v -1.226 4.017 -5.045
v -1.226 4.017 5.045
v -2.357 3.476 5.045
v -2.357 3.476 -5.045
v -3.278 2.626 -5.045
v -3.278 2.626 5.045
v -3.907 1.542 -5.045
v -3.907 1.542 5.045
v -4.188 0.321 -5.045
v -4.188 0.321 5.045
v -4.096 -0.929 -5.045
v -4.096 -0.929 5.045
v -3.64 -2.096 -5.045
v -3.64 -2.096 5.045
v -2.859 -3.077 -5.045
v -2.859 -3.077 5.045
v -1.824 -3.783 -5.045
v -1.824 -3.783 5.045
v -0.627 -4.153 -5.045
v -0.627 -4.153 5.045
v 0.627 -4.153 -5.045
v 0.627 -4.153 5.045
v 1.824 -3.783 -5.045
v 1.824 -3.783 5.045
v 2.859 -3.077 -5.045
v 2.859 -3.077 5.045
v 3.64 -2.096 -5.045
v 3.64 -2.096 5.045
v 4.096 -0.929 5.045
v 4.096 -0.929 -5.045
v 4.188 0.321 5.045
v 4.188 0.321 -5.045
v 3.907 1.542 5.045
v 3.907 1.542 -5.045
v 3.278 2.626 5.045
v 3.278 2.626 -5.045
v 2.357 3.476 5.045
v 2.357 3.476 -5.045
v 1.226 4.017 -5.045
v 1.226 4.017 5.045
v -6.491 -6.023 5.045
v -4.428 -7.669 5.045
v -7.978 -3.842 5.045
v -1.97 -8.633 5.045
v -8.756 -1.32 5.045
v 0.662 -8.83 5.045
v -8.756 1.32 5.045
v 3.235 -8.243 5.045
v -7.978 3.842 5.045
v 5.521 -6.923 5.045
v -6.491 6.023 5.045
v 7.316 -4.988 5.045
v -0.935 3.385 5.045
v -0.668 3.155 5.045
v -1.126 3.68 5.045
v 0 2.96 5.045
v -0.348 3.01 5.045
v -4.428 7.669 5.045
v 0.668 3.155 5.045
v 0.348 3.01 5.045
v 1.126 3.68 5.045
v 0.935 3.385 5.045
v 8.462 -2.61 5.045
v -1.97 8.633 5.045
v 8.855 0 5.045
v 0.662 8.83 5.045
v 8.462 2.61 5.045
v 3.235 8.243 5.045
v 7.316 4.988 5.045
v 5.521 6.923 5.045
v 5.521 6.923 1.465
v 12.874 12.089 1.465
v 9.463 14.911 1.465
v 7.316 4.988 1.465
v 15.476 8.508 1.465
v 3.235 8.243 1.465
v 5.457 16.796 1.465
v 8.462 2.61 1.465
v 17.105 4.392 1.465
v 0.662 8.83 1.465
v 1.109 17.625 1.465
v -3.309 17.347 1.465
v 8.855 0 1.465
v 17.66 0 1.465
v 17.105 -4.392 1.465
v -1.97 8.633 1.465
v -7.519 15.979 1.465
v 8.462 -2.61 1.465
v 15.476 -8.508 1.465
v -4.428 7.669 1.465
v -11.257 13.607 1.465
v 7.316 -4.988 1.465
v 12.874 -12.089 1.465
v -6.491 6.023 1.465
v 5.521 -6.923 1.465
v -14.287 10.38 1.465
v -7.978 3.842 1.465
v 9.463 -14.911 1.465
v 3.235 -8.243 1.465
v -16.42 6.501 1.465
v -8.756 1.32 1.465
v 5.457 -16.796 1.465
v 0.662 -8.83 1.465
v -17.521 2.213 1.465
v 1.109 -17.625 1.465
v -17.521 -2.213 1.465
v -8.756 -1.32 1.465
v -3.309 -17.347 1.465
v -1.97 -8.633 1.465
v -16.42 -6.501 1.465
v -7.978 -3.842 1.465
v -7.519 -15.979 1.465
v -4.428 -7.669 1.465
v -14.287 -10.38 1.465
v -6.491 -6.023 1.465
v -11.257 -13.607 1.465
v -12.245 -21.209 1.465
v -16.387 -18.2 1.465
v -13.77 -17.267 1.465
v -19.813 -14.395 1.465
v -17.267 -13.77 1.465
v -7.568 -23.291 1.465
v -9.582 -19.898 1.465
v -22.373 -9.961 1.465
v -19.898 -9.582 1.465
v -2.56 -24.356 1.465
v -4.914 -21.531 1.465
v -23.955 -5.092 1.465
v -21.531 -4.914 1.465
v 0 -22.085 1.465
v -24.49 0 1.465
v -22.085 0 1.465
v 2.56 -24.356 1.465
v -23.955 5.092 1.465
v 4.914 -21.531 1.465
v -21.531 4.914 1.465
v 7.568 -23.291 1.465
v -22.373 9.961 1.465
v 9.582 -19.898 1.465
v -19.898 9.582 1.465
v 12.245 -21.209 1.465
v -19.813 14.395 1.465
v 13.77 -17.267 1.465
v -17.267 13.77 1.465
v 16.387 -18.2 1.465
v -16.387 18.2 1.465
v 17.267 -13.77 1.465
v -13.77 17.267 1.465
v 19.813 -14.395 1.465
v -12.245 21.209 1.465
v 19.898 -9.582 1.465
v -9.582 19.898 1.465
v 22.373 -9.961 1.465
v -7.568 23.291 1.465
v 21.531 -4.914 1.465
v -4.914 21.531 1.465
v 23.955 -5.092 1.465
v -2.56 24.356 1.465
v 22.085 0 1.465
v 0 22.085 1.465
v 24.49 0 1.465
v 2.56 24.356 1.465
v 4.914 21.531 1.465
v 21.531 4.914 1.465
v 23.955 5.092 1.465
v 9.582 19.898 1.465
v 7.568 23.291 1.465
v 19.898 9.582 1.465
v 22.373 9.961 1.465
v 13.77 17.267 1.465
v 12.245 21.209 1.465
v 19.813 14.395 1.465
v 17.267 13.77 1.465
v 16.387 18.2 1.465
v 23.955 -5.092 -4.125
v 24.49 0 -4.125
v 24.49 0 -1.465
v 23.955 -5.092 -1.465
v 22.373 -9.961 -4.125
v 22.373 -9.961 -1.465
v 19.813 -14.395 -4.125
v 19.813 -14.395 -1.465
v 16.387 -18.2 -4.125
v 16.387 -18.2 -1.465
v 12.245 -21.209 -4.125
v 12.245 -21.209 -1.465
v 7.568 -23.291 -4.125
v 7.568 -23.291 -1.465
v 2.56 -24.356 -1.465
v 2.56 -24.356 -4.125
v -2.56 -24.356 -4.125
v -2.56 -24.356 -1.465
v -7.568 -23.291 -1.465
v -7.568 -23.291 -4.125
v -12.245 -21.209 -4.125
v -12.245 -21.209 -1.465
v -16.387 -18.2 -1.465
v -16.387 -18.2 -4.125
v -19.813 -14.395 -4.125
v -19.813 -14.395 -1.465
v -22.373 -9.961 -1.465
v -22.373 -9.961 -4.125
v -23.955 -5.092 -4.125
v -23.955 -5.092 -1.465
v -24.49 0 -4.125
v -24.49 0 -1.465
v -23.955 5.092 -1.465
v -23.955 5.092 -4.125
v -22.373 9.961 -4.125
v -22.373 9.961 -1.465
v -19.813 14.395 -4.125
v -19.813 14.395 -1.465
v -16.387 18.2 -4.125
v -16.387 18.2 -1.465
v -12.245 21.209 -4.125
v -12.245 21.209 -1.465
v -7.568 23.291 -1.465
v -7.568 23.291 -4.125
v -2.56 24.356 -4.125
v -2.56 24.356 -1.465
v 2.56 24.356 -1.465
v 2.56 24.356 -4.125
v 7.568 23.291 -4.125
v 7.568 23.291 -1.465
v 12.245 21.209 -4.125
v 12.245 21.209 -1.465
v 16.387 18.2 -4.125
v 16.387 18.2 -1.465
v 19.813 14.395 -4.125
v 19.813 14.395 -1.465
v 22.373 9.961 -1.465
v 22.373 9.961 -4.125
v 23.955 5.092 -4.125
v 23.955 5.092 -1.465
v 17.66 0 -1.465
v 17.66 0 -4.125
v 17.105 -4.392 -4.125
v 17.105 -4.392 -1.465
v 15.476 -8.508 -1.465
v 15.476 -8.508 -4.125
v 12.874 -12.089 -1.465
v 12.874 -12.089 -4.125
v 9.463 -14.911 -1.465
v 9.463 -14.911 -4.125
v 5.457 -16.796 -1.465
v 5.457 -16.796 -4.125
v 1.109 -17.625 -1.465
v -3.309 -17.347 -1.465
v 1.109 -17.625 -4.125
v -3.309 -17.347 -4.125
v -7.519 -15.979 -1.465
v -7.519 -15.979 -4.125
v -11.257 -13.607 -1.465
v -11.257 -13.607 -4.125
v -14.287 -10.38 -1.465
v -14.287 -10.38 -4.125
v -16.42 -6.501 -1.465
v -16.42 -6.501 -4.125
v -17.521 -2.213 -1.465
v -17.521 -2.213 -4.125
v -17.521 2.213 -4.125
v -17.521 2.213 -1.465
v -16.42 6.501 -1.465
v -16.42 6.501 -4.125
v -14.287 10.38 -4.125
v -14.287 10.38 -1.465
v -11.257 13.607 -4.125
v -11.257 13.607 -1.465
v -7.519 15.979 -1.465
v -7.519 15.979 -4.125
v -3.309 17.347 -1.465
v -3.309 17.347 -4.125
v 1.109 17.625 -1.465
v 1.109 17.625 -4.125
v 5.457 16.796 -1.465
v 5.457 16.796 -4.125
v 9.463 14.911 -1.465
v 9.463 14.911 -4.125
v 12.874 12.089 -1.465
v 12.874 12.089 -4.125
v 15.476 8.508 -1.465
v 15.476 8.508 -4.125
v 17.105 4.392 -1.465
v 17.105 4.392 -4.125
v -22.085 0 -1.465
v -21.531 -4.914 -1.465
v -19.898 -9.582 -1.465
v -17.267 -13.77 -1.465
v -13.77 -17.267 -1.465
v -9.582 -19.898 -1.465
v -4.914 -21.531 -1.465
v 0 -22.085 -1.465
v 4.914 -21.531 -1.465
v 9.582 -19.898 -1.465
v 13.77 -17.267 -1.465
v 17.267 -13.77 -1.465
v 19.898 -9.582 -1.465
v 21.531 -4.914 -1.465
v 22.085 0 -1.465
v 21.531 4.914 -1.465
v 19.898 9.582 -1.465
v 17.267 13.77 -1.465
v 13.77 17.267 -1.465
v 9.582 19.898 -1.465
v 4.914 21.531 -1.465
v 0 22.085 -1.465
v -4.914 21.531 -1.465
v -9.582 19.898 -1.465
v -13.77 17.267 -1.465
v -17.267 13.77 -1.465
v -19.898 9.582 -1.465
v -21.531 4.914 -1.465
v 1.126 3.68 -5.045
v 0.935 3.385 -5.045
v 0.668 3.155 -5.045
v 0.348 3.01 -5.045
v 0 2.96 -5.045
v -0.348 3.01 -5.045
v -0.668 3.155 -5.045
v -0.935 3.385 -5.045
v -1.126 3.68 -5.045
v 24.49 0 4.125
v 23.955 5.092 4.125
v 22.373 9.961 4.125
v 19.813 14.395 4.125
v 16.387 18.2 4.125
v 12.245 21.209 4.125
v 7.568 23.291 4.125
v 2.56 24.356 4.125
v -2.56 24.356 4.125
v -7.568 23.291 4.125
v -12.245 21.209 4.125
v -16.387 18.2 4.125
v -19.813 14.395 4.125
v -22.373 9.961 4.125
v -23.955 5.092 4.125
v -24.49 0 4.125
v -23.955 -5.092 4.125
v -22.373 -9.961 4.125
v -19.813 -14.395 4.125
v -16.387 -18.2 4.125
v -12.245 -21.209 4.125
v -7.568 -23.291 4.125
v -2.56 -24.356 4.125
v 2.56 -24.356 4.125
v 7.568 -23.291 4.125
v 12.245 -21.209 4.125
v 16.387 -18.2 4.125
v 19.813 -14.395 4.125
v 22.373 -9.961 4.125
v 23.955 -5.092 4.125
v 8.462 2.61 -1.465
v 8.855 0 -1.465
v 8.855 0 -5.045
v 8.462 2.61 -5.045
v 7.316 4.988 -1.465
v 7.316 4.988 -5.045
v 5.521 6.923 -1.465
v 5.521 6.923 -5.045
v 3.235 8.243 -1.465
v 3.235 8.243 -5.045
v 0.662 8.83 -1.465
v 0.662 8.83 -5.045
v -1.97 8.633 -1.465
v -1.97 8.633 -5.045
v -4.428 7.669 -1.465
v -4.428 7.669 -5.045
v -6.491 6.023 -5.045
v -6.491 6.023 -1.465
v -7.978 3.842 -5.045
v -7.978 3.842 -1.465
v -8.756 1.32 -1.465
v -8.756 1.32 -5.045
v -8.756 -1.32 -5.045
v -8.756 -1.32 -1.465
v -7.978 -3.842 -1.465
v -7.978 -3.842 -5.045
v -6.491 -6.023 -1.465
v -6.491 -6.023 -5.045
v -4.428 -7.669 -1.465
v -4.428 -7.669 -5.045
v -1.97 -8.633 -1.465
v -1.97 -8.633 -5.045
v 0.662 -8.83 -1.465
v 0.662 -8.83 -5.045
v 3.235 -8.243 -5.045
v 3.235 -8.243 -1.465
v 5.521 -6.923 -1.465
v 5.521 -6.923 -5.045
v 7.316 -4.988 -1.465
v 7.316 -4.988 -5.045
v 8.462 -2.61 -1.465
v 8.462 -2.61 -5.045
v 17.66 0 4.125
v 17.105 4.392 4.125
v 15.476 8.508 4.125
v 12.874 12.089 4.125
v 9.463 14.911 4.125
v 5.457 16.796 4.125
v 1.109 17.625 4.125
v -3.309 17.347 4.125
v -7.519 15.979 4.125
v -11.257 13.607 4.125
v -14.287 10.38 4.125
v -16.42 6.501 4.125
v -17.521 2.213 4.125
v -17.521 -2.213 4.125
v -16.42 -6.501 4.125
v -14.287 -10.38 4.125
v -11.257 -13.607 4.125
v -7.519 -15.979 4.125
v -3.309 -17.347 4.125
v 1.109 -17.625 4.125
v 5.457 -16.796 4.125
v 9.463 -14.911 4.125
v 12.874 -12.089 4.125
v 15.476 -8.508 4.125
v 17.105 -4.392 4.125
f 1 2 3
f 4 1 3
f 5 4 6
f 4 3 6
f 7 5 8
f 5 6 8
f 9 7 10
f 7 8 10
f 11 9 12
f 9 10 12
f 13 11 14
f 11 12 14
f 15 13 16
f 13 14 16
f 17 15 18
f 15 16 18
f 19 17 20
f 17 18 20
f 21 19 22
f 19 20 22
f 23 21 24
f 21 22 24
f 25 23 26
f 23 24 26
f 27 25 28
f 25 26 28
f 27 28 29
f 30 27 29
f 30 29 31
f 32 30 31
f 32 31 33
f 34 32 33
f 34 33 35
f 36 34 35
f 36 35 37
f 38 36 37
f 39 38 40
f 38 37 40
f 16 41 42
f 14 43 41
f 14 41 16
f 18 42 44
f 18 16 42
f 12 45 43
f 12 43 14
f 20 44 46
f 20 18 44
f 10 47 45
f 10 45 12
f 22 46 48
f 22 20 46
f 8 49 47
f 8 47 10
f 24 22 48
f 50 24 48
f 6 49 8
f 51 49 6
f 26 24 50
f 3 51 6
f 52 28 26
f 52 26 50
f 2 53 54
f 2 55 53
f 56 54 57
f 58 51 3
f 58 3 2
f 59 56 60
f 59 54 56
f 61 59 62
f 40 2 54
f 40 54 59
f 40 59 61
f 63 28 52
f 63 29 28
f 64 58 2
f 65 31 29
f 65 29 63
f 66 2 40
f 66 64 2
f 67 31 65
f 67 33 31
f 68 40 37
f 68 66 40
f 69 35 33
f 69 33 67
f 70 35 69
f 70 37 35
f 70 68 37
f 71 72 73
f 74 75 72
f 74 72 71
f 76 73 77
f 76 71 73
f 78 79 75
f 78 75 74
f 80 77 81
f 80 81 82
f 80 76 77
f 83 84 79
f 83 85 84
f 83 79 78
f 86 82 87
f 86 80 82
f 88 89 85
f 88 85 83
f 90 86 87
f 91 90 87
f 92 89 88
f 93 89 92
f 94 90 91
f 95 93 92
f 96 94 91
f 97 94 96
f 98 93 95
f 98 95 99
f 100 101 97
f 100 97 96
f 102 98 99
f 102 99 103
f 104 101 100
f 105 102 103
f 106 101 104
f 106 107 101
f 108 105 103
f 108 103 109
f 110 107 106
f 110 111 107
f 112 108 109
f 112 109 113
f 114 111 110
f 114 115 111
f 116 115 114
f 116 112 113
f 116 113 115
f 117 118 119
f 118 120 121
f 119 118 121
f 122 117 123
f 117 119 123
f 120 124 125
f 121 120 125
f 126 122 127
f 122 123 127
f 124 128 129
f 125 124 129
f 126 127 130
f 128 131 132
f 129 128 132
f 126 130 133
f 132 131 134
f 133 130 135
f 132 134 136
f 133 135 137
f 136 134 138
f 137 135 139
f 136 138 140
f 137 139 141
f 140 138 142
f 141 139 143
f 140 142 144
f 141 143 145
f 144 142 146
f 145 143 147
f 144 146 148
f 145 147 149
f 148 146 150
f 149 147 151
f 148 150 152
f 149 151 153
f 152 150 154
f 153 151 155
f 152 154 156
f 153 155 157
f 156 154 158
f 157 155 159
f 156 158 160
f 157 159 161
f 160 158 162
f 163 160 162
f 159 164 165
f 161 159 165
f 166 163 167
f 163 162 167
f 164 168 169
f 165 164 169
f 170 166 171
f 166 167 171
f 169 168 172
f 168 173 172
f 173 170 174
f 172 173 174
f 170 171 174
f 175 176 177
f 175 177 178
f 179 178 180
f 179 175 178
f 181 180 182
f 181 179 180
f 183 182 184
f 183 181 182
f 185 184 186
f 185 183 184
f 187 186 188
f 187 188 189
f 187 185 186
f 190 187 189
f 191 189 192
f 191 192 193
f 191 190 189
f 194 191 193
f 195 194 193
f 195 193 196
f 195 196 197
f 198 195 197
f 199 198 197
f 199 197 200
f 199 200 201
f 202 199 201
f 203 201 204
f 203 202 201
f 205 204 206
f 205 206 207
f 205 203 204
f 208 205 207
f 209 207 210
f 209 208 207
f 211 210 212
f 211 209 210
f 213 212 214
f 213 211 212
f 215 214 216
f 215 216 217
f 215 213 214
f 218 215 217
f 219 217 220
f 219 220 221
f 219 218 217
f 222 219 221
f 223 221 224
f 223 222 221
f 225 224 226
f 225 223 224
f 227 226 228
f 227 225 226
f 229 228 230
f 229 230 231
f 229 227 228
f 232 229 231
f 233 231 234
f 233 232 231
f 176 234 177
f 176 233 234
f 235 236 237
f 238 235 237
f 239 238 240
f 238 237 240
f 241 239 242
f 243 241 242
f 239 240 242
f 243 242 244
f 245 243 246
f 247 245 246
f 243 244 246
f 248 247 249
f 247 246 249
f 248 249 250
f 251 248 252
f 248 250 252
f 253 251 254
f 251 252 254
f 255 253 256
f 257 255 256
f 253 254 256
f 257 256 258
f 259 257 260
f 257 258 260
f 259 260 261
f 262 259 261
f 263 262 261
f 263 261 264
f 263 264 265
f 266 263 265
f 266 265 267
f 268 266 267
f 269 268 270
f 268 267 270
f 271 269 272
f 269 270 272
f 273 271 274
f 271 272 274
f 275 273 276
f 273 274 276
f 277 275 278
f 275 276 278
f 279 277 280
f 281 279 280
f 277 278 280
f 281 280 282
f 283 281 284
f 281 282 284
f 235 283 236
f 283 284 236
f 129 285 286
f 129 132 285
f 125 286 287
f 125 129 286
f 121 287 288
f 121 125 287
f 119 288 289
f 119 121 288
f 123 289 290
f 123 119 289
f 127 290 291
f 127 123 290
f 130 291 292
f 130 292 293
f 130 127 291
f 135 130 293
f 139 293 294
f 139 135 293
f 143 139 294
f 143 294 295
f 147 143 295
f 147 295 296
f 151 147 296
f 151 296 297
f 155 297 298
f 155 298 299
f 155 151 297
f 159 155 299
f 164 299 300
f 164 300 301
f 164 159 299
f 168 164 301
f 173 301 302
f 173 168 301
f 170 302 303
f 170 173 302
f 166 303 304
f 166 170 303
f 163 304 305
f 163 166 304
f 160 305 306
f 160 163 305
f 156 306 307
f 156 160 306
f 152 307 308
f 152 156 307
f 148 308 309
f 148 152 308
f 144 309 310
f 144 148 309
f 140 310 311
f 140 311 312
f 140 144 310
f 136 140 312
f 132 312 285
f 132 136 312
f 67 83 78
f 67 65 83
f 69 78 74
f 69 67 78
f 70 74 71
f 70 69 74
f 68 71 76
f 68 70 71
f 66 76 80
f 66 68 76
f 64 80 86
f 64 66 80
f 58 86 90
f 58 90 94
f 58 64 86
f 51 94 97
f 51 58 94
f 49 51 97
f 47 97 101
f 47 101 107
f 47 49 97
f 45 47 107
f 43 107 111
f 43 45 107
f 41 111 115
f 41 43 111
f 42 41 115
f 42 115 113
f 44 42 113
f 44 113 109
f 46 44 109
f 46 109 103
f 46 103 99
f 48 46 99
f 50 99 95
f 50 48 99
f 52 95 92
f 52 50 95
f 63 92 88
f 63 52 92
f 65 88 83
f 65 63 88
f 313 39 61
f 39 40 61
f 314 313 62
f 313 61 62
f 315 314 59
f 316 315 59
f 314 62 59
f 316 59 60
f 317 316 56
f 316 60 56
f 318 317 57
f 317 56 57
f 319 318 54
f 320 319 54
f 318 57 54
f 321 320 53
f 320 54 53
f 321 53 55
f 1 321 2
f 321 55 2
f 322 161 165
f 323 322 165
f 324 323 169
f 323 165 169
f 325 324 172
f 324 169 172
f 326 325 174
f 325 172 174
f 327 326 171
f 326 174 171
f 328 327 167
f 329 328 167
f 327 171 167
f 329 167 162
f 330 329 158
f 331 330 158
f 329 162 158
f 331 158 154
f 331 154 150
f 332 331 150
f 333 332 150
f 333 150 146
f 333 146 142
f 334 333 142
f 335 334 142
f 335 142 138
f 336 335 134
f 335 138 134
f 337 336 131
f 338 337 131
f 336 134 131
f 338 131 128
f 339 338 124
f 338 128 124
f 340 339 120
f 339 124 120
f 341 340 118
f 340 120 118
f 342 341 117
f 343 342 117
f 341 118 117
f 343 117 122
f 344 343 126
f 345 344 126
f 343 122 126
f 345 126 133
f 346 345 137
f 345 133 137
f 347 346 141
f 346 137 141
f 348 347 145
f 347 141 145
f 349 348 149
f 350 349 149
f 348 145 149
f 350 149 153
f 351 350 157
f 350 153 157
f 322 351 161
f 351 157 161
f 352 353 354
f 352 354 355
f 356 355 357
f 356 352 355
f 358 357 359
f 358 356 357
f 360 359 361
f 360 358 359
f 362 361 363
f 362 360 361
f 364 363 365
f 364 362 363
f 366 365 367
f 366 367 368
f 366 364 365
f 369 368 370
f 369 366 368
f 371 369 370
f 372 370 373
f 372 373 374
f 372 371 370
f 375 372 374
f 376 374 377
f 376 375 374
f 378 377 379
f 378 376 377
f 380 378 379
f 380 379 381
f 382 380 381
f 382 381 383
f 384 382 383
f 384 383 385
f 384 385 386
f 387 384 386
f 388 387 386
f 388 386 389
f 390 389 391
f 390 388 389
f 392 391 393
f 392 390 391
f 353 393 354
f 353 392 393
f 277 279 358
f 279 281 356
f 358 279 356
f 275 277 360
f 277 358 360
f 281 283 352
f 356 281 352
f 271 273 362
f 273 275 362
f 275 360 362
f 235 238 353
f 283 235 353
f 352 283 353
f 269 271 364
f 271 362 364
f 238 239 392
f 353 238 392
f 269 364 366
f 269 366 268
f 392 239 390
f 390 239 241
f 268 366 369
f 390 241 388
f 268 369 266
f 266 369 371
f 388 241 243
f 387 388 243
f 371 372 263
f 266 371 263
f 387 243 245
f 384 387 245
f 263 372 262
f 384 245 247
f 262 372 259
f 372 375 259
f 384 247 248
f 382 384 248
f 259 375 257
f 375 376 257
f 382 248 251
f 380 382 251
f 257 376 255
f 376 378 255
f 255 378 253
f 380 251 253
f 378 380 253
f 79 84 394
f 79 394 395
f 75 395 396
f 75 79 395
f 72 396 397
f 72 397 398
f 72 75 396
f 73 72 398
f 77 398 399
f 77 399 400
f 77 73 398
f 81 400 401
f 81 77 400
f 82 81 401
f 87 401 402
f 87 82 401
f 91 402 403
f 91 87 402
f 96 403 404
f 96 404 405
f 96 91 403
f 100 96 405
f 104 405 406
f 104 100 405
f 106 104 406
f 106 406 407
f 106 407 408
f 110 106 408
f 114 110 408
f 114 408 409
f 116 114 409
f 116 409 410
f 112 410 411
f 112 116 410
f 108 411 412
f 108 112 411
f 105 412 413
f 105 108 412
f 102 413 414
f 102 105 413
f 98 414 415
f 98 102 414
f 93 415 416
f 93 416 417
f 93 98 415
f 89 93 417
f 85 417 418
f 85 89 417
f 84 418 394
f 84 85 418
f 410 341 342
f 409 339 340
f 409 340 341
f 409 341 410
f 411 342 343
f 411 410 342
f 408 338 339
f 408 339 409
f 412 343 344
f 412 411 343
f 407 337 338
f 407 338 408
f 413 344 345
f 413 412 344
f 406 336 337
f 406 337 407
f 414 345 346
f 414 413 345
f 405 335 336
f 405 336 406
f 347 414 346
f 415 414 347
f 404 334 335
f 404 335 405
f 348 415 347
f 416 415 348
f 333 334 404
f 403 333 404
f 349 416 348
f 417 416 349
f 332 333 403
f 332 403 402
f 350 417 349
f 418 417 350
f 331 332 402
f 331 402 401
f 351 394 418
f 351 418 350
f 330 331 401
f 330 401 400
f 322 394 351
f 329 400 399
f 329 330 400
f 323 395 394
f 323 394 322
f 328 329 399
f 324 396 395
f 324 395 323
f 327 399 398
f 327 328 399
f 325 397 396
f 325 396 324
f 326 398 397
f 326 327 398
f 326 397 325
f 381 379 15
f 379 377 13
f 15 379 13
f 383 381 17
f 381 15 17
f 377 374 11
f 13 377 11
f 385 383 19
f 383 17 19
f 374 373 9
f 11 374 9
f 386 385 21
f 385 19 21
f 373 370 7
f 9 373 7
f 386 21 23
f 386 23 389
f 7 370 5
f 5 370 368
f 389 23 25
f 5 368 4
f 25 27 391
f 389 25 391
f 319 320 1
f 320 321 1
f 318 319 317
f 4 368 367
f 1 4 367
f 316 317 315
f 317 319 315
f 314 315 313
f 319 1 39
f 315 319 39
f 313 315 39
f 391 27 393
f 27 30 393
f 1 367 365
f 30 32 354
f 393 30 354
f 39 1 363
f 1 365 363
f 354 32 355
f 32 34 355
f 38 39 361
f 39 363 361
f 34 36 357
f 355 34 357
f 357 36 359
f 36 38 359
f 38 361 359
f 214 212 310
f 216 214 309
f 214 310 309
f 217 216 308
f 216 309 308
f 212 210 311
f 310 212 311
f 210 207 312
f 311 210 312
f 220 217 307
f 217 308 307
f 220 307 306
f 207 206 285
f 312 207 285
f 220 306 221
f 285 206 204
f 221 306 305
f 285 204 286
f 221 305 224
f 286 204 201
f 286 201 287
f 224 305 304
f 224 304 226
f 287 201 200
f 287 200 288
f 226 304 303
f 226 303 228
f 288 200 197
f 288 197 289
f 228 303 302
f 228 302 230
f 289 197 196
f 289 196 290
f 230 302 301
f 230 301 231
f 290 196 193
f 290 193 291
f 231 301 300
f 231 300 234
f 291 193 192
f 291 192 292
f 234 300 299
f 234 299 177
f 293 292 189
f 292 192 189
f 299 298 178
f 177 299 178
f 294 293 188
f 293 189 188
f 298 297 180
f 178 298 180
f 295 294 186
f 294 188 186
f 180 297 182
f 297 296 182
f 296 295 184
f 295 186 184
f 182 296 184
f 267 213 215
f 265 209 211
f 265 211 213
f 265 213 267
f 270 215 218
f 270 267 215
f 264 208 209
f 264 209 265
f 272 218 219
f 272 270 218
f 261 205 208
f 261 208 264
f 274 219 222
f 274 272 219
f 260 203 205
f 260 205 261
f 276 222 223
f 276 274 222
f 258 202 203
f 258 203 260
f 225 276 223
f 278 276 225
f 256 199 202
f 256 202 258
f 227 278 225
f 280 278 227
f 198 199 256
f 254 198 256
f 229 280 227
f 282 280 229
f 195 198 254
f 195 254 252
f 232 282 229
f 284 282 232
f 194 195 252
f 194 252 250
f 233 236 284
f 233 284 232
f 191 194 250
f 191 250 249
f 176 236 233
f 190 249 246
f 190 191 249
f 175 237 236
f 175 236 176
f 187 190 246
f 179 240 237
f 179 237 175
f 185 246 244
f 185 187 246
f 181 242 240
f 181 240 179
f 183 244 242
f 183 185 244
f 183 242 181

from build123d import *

# Parameters (mm, degrees)
SKETCH1_R           = 8.855
BOSS_EXTRUDE1_DEPTH = 5.045
SKETCH2_R           = 22.085
SKETCH2_R_2         = 8.855
BOSS_EXTRUDE2_DEPTH = 1.465
SKETCH4_R           = 24.49
SKETCH4_R_2         = 17.66
BOSS_EXTRUDE3_DEPTH = 2.66
BOSS_EXTRUDE4_START = 2.66
SKETCH5_R           = 24.49
SKETCH5_R_2         = 17.66
BOSS_EXTRUDE4_DEPTH = 2.66


with BuildPart() as part:
    # Sketch1 → Boss-Extrude1 (new, symmetric)
    with BuildSketch(Plane.XY):
        Circle(SKETCH1_R)
        with BuildLine():
            ThreePointArc((-1.226414925, 4.016952381), (0, -4.2), (1.226414925, 4.016952381))
            ThreePointArc((1.226414925, 4.016952381), (0, 2.96), (-1.226414925, 4.016952381))
        make_face(mode=Mode.SUBTRACT)
    extrude(amount=BOSS_EXTRUDE1_DEPTH, both=True)

    # Sketch2 → Boss-Extrude2 (add, symmetric)
    with BuildSketch(Plane.XY):
        with Locations(Location((0, 0, 0), (0, 0, 180))):
            Circle(SKETCH2_R)
        Circle(SKETCH2_R_2, mode=Mode.SUBTRACT)
    extrude(amount=BOSS_EXTRUDE2_DEPTH, both=True)

    # Sketch4 → Boss-Extrude3 (add)
    with BuildSketch(Plane.XY.offset(1.465)):
        Circle(SKETCH4_R)
        Circle(SKETCH4_R_2, mode=Mode.SUBTRACT)
    extrude(amount=BOSS_EXTRUDE3_DEPTH)

    # Sketch5 → Boss-Extrude4 (add)
    with BuildSketch(Plane(origin=(0, 0, -1.465), x_dir=(-1, 0, 0), z_dir=(0, 0, -1)).offset(BOSS_EXTRUDE4_START)):
        with Locations(Location((0, 0, 0), (0, 0, 180))):
            Circle(SKETCH5_R)
        with Locations(Location((0, 0, 0), (0, 0, 180))):
            Circle(SKETCH5_R_2, mode=Mode.SUBTRACT)
    extrude(amount=-BOSS_EXTRUDE4_DEPTH)


solid = part.part
